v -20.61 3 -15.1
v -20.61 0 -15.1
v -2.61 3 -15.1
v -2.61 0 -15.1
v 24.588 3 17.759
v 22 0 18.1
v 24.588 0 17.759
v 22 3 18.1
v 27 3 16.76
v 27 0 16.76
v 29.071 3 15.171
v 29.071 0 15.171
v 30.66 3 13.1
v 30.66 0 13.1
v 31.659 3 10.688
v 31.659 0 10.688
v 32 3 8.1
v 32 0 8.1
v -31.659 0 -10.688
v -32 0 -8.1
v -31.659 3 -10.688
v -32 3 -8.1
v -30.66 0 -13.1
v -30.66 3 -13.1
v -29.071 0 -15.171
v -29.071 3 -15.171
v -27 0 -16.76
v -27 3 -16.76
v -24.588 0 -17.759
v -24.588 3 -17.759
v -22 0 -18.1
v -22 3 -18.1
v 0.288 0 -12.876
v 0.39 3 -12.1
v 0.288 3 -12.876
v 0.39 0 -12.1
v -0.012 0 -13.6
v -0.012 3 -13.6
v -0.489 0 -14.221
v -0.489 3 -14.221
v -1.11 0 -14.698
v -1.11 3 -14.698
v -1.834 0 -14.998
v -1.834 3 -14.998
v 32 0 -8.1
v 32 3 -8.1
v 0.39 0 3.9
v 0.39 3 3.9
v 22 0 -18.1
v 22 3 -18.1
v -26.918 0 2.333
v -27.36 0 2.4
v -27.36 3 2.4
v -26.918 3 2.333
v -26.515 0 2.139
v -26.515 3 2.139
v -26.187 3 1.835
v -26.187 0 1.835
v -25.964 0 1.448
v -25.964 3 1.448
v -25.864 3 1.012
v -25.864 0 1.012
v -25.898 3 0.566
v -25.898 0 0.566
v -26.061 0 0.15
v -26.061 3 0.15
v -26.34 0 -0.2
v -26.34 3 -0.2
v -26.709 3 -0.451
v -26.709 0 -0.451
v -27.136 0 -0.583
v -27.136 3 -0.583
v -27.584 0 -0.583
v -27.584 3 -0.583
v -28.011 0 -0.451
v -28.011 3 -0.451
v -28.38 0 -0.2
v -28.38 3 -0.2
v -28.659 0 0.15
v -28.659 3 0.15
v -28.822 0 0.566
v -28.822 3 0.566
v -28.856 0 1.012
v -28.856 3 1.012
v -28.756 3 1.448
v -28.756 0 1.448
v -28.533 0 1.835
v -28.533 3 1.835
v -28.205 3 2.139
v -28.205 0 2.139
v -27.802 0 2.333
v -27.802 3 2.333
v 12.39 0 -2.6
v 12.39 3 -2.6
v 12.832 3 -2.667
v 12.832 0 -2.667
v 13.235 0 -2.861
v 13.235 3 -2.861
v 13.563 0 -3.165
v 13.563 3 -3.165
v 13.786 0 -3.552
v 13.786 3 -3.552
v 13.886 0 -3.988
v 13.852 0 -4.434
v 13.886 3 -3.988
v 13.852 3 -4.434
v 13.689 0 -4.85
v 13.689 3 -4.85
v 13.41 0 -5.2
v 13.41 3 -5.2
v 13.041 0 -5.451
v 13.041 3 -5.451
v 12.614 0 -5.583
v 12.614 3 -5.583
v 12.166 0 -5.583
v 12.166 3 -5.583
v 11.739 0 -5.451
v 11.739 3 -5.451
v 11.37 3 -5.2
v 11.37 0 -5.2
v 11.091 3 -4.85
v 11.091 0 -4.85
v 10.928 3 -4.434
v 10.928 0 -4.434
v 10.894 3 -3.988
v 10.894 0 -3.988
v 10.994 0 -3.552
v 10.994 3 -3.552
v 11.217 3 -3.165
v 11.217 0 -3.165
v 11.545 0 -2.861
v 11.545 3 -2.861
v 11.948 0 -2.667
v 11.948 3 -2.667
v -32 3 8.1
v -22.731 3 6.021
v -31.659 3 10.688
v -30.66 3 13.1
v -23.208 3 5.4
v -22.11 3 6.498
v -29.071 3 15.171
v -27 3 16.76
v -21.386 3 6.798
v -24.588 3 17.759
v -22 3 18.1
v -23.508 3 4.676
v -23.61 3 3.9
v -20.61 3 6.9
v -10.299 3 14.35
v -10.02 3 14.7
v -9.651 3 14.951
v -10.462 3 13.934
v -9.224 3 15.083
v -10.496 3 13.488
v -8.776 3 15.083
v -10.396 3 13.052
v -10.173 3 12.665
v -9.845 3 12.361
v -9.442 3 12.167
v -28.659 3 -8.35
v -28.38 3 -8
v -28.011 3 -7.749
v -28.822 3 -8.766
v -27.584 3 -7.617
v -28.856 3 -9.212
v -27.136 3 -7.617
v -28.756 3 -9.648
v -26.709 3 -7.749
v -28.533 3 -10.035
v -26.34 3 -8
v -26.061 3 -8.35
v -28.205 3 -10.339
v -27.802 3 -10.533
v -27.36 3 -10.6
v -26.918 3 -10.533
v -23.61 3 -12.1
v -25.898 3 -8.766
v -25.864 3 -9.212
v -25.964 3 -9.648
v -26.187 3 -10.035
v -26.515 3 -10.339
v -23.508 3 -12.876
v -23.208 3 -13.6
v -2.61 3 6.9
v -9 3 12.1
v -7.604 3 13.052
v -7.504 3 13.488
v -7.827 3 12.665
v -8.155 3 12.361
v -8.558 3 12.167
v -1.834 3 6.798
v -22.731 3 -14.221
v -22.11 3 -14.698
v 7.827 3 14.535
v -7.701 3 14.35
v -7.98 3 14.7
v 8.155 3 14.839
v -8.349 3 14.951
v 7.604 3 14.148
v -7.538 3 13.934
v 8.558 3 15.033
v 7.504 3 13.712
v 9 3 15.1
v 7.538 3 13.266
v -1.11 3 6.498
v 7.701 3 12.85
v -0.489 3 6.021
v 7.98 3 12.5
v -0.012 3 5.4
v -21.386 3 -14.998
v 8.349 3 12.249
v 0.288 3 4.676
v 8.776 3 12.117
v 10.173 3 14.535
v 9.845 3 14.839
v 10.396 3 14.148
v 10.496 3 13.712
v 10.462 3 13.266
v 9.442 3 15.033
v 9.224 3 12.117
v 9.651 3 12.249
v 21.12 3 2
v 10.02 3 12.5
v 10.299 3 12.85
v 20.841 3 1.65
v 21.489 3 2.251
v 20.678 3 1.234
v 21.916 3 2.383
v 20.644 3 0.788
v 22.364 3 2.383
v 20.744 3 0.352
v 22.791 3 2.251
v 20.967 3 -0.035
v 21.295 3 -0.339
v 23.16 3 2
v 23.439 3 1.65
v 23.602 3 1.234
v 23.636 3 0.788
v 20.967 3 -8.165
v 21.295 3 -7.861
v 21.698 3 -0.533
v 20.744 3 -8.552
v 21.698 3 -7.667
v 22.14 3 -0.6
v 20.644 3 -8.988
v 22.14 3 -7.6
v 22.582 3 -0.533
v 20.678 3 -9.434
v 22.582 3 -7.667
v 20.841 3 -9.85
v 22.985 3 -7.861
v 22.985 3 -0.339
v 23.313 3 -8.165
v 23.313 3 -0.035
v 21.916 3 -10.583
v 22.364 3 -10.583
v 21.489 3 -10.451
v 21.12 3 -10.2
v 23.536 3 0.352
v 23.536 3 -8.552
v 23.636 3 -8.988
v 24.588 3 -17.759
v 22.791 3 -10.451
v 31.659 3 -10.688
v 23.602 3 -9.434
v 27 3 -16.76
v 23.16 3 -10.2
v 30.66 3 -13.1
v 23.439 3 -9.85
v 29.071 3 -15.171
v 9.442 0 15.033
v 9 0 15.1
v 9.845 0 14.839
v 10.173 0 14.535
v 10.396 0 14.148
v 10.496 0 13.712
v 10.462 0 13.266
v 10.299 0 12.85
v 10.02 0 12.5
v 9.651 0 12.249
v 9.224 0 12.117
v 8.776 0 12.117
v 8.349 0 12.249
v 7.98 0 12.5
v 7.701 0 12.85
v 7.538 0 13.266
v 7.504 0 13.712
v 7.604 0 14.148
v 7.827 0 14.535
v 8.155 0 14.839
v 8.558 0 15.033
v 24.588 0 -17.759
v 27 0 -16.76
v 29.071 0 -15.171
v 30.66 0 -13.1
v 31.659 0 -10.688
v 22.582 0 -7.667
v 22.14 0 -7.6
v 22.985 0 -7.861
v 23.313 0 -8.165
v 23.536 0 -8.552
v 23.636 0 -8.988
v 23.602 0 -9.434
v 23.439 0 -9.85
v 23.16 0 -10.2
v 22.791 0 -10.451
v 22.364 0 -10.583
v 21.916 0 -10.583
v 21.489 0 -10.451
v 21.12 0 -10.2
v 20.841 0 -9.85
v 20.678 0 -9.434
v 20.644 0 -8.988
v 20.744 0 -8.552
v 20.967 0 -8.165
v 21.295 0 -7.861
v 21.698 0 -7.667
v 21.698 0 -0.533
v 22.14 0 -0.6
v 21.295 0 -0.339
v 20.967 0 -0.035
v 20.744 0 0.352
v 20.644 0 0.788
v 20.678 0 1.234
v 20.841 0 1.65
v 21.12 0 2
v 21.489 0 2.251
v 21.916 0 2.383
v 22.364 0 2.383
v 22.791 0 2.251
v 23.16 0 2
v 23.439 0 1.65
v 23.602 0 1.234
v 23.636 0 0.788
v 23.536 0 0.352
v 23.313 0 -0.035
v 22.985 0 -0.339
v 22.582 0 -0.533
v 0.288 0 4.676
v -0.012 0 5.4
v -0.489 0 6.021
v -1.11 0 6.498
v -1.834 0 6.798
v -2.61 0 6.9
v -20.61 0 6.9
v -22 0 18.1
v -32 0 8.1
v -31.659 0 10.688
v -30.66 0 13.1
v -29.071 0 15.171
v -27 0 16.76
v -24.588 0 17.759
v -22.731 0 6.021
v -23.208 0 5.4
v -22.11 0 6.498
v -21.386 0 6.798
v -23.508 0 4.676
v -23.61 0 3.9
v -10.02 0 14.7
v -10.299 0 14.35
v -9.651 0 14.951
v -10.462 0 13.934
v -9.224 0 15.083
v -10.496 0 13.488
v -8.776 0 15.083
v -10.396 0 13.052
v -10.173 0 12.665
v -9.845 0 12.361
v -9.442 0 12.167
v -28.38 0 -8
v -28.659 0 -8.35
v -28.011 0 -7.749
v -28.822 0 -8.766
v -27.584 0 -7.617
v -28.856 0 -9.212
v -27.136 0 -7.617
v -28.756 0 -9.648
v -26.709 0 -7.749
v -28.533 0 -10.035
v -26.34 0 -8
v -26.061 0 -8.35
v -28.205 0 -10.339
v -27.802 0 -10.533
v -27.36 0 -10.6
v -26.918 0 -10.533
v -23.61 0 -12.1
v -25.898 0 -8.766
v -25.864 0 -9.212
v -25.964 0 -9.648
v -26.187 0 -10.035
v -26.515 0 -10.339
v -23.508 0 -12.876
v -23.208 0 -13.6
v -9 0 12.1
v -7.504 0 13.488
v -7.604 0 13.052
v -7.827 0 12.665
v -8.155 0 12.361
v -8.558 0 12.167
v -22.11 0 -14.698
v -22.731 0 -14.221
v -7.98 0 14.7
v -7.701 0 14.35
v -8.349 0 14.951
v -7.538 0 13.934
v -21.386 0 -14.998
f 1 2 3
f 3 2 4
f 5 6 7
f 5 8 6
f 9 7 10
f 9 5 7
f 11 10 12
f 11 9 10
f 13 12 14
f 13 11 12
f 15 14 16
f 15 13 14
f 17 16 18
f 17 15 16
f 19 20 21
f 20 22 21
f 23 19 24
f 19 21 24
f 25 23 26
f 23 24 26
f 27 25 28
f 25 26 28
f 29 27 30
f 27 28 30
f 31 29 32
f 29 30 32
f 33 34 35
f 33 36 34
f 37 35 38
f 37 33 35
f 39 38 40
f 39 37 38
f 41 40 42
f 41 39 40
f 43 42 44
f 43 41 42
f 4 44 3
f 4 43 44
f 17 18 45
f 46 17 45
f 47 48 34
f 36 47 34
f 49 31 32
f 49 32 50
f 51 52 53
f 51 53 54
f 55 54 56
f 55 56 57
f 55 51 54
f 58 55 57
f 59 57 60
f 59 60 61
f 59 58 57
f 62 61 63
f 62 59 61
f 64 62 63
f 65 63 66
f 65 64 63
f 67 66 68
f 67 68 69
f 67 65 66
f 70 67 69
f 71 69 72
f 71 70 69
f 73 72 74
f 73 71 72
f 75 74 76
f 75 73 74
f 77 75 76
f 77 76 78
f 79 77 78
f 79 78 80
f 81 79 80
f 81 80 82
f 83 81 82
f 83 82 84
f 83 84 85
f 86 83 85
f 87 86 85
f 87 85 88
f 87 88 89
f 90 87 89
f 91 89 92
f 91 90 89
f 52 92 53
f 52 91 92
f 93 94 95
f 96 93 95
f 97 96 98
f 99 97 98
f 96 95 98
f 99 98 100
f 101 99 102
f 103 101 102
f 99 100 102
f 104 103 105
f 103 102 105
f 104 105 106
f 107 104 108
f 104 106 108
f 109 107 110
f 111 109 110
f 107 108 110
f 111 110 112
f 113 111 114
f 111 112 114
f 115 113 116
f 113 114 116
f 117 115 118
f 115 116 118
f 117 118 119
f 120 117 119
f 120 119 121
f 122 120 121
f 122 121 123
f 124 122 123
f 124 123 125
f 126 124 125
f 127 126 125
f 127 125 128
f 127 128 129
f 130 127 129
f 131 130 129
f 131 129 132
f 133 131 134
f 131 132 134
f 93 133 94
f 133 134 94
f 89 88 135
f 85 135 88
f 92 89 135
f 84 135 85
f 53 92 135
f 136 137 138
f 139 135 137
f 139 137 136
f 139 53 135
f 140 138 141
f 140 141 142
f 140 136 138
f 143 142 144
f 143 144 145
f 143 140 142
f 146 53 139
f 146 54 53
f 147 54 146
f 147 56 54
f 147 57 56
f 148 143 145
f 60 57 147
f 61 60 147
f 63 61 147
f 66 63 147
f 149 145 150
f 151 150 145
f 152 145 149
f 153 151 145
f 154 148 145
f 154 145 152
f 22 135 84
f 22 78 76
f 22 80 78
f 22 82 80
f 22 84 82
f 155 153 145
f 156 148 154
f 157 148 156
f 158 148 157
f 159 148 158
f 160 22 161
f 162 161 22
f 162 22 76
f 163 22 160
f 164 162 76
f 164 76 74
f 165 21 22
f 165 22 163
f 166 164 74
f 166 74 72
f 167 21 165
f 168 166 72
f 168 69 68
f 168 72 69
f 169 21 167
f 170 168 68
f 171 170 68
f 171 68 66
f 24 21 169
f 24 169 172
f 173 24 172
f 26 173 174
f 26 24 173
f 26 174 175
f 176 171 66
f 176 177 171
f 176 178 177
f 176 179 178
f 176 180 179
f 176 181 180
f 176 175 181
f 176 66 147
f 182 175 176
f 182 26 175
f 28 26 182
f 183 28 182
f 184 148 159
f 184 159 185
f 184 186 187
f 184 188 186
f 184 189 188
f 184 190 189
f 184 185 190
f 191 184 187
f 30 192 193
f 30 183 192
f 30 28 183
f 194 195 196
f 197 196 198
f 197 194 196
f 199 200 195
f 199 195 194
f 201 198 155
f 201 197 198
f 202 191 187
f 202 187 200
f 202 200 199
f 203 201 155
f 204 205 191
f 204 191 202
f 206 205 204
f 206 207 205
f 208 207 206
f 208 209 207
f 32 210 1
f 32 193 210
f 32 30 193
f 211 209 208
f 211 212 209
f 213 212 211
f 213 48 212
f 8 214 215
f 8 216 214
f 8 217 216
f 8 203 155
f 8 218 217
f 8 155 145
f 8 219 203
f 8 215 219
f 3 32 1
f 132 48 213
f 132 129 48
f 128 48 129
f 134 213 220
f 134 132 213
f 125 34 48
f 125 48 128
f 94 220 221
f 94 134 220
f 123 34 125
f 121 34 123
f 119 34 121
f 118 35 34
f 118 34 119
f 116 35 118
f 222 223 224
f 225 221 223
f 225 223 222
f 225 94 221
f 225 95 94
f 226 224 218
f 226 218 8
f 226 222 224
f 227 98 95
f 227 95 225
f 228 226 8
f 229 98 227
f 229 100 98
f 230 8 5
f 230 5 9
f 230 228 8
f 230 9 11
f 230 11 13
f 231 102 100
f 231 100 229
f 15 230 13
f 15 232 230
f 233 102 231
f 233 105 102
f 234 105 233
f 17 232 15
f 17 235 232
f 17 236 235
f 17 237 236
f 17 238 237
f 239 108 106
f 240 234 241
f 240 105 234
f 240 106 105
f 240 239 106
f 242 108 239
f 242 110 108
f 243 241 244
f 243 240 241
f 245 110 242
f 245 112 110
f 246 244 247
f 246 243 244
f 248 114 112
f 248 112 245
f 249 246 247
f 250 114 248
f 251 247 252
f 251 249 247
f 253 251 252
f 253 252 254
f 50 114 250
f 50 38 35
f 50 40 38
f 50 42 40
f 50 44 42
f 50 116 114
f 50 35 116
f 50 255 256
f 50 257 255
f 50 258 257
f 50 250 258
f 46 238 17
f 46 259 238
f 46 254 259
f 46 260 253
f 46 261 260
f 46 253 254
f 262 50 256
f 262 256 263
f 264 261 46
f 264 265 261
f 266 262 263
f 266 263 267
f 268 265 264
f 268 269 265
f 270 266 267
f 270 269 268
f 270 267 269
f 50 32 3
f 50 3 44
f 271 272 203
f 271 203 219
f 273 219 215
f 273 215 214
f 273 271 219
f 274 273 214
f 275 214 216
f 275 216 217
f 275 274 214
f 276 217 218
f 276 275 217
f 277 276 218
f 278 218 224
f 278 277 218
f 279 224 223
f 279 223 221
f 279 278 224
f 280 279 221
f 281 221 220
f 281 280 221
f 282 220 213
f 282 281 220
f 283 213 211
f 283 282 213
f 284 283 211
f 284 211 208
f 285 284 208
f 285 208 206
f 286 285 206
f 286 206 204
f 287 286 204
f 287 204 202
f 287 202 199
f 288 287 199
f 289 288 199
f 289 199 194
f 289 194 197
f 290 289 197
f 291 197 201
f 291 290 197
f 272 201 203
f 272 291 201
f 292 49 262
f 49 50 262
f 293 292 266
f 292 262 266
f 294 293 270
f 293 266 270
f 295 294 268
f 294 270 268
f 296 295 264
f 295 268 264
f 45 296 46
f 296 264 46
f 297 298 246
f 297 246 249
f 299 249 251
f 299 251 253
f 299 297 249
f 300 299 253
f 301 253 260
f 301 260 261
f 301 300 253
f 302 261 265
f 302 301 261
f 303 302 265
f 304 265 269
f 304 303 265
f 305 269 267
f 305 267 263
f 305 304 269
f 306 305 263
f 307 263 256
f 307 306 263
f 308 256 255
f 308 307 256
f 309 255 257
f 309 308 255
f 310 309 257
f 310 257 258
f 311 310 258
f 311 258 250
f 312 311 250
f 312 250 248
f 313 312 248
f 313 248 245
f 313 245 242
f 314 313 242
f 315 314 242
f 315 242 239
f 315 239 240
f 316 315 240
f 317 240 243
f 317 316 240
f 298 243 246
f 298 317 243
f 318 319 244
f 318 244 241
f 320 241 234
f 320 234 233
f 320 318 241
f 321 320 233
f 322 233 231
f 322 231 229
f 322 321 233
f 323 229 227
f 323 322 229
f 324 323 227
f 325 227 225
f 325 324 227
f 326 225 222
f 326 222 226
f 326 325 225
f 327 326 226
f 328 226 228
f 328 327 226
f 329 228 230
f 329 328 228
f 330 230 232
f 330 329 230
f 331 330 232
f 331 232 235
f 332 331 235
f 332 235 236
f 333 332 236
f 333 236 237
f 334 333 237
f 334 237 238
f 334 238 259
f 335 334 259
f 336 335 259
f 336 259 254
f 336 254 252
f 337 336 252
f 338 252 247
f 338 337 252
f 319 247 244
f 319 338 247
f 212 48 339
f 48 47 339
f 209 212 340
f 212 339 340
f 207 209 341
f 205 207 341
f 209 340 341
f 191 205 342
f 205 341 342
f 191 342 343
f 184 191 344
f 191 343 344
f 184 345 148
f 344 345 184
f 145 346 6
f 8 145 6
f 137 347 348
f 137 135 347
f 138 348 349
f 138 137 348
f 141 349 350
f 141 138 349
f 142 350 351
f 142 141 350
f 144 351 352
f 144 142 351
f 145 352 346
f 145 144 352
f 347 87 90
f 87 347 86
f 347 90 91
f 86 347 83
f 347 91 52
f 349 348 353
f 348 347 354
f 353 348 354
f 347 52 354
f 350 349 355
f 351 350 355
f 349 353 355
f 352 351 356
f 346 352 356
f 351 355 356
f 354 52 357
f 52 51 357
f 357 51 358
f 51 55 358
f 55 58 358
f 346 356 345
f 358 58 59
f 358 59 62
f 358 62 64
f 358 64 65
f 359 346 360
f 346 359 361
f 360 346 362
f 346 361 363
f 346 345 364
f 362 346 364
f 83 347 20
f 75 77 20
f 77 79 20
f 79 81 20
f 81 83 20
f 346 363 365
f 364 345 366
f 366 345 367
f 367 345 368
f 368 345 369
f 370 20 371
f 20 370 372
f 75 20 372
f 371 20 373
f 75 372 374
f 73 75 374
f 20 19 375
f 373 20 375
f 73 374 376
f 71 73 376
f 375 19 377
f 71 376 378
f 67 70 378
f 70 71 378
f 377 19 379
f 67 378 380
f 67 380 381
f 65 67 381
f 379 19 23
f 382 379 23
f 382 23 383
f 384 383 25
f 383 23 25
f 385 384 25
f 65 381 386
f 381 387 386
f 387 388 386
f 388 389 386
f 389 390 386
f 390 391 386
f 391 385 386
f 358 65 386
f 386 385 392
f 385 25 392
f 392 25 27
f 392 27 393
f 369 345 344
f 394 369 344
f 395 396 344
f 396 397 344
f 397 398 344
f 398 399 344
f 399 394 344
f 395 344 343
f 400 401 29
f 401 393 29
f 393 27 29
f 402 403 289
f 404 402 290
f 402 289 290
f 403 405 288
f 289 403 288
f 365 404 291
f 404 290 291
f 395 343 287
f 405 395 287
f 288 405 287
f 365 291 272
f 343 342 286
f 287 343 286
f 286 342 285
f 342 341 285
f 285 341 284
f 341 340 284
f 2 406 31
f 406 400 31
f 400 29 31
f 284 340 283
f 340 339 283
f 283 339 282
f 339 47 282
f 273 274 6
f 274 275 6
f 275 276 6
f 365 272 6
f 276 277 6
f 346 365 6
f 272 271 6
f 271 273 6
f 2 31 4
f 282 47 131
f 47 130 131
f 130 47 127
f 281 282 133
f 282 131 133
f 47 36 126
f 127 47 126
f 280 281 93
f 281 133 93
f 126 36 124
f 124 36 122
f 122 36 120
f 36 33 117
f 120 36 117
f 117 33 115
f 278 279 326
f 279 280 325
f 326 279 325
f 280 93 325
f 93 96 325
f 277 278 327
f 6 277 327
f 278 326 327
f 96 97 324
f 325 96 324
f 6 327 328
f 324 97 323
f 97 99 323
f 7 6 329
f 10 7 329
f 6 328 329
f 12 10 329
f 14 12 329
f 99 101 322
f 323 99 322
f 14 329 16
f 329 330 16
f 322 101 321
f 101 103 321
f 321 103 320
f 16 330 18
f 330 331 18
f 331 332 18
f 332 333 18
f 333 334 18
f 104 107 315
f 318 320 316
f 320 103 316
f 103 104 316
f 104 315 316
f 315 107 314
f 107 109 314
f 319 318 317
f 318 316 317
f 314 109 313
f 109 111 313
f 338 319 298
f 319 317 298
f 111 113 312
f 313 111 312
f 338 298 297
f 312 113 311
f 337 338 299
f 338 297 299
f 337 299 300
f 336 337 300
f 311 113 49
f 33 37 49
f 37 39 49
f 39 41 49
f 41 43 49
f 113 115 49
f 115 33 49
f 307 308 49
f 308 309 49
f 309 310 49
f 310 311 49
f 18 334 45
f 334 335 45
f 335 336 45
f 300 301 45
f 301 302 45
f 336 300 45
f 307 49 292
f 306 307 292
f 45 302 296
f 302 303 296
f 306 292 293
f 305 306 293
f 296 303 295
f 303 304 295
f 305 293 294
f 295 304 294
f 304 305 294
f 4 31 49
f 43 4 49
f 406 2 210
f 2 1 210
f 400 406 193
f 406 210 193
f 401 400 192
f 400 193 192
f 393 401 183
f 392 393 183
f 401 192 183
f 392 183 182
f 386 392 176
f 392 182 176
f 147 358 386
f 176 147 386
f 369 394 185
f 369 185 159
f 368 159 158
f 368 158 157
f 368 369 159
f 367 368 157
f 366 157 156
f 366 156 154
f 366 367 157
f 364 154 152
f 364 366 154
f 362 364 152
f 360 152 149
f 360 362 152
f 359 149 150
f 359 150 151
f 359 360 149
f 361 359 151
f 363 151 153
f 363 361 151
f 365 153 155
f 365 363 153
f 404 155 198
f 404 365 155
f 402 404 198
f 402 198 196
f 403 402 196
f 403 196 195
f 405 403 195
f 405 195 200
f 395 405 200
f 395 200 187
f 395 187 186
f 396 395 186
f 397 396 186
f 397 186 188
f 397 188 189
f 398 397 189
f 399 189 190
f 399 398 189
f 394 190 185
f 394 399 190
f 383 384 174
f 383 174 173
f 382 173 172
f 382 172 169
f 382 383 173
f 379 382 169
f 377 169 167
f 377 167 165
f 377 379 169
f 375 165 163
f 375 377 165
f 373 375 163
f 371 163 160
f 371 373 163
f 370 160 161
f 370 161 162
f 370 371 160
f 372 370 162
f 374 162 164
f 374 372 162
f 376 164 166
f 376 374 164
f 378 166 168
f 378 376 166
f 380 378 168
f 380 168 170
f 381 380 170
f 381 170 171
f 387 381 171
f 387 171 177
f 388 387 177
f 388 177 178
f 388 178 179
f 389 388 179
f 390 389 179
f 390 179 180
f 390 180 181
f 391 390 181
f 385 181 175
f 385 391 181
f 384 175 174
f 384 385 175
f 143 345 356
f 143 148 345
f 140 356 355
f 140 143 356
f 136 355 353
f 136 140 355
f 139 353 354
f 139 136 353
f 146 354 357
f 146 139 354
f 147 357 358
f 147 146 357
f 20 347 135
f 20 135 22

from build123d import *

# Parameters (mm, degrees)
SKETCH_1_W          = 64
SKETCH_1_H          = 36.2
SKETCH_1_R          = 1.5
SKETCH_1_W_2        = 42
SKETCH_1_H_2        = 22
EXTRUDE_1_DEPTH     = 3
SKETCH_2_W          = 18
SKETCH_2_H          = 22
EXTRUDE_2_DEPTH     = 3
SKETCH_3_R          = 1.5
CUT_EXTRUDE_1_DEPTH = 3
FILLET_1_R          = 10
FILLET_2_R          = 3


with BuildPart() as part:
    # 草图1 → 凸台-拉伸1 (new body)
    with BuildSketch(Plane(origin=(0, 0, 0), x_dir=(1, 0, 0), z_dir=(0, 1, 0))):
        Rectangle(SKETCH_1_W, SKETCH_1_H)
        with Locations(Location((22.14, 9.1, 0), (0, 0, 270))):
            Circle(SKETCH_1_R, mode=Mode.SUBTRACT)
        with Locations(Location((22.14, -0.9, 0), (0, 0, 90))):
            Circle(SKETCH_1_R, mode=Mode.SUBTRACT)
        with Locations(Location((-27.36, -0.9, 0), (0, 0, 270))):
            Circle(SKETCH_1_R, mode=Mode.SUBTRACT)
        with Locations(Location((-27.36, 9.1, 0), (0, 0, 90))):
            Circle(SKETCH_1_R, mode=Mode.SUBTRACT)
        with Locations(Location((9, -13.6, 0), (0, 0, 270))):
            Circle(SKETCH_1_R, mode=Mode.SUBTRACT)
        with Locations(Location((-9, -13.6, 0), (0, 0, 90))):
            Circle(SKETCH_1_R, mode=Mode.SUBTRACT)
        with Locations((-2.61, 4.1)):
            Rectangle(SKETCH_1_W_2, SKETCH_1_H_2, mode=Mode.SUBTRACT)
    extrude(amount=EXTRUDE_1_DEPTH)

    # 草图2 → 凸台-拉伸2 (add)
    with BuildSketch(Plane(origin=(0, 3, 0), x_dir=(1, 0, 0), z_dir=(0, 1, 0))):
        with Locations((9.39, 4.1)):
            Rectangle(SKETCH_2_W, SKETCH_2_H)
    extrude(amount=-EXTRUDE_2_DEPTH)

    # 草图3 → 切除-拉伸1 (cut)
    with BuildSketch(Plane(origin=(0, 3, 0), x_dir=(1, 0, 0), z_dir=(0, 1, 0))):
        with Locations(Location((12.39, 4.1, 0), (0, 0, 270))):
            Circle(SKETCH_3_R)
    extrude(amount=-CUT_EXTRUDE_1_DEPTH, mode=Mode.SUBTRACT)

    # 圆角1
    fillet_1_edges = [part.edges().sort_by_distance(p)[0] for p in [
        (32, 1.5, 18.1),
        (-32, 1.5, 18.1),
        (-32, 1.5, -18.1),
        (32, 1.5, -18.1),
    ]]
    fillet(fillet_1_edges, radius=FILLET_1_R)

    # 圆角2
    fillet_2_edges = [part.edges().sort_by_distance(p)[0] for p in [
        (-23.61, 1.5, -15.1),
        (-23.61, 1.5, 6.9),
        (0.39, 1.5, -15.1),
        (0.39, 1.5, 6.9),
    ]]
    fillet(fillet_2_edges, radius=FILLET_2_R)


solid = part.part
